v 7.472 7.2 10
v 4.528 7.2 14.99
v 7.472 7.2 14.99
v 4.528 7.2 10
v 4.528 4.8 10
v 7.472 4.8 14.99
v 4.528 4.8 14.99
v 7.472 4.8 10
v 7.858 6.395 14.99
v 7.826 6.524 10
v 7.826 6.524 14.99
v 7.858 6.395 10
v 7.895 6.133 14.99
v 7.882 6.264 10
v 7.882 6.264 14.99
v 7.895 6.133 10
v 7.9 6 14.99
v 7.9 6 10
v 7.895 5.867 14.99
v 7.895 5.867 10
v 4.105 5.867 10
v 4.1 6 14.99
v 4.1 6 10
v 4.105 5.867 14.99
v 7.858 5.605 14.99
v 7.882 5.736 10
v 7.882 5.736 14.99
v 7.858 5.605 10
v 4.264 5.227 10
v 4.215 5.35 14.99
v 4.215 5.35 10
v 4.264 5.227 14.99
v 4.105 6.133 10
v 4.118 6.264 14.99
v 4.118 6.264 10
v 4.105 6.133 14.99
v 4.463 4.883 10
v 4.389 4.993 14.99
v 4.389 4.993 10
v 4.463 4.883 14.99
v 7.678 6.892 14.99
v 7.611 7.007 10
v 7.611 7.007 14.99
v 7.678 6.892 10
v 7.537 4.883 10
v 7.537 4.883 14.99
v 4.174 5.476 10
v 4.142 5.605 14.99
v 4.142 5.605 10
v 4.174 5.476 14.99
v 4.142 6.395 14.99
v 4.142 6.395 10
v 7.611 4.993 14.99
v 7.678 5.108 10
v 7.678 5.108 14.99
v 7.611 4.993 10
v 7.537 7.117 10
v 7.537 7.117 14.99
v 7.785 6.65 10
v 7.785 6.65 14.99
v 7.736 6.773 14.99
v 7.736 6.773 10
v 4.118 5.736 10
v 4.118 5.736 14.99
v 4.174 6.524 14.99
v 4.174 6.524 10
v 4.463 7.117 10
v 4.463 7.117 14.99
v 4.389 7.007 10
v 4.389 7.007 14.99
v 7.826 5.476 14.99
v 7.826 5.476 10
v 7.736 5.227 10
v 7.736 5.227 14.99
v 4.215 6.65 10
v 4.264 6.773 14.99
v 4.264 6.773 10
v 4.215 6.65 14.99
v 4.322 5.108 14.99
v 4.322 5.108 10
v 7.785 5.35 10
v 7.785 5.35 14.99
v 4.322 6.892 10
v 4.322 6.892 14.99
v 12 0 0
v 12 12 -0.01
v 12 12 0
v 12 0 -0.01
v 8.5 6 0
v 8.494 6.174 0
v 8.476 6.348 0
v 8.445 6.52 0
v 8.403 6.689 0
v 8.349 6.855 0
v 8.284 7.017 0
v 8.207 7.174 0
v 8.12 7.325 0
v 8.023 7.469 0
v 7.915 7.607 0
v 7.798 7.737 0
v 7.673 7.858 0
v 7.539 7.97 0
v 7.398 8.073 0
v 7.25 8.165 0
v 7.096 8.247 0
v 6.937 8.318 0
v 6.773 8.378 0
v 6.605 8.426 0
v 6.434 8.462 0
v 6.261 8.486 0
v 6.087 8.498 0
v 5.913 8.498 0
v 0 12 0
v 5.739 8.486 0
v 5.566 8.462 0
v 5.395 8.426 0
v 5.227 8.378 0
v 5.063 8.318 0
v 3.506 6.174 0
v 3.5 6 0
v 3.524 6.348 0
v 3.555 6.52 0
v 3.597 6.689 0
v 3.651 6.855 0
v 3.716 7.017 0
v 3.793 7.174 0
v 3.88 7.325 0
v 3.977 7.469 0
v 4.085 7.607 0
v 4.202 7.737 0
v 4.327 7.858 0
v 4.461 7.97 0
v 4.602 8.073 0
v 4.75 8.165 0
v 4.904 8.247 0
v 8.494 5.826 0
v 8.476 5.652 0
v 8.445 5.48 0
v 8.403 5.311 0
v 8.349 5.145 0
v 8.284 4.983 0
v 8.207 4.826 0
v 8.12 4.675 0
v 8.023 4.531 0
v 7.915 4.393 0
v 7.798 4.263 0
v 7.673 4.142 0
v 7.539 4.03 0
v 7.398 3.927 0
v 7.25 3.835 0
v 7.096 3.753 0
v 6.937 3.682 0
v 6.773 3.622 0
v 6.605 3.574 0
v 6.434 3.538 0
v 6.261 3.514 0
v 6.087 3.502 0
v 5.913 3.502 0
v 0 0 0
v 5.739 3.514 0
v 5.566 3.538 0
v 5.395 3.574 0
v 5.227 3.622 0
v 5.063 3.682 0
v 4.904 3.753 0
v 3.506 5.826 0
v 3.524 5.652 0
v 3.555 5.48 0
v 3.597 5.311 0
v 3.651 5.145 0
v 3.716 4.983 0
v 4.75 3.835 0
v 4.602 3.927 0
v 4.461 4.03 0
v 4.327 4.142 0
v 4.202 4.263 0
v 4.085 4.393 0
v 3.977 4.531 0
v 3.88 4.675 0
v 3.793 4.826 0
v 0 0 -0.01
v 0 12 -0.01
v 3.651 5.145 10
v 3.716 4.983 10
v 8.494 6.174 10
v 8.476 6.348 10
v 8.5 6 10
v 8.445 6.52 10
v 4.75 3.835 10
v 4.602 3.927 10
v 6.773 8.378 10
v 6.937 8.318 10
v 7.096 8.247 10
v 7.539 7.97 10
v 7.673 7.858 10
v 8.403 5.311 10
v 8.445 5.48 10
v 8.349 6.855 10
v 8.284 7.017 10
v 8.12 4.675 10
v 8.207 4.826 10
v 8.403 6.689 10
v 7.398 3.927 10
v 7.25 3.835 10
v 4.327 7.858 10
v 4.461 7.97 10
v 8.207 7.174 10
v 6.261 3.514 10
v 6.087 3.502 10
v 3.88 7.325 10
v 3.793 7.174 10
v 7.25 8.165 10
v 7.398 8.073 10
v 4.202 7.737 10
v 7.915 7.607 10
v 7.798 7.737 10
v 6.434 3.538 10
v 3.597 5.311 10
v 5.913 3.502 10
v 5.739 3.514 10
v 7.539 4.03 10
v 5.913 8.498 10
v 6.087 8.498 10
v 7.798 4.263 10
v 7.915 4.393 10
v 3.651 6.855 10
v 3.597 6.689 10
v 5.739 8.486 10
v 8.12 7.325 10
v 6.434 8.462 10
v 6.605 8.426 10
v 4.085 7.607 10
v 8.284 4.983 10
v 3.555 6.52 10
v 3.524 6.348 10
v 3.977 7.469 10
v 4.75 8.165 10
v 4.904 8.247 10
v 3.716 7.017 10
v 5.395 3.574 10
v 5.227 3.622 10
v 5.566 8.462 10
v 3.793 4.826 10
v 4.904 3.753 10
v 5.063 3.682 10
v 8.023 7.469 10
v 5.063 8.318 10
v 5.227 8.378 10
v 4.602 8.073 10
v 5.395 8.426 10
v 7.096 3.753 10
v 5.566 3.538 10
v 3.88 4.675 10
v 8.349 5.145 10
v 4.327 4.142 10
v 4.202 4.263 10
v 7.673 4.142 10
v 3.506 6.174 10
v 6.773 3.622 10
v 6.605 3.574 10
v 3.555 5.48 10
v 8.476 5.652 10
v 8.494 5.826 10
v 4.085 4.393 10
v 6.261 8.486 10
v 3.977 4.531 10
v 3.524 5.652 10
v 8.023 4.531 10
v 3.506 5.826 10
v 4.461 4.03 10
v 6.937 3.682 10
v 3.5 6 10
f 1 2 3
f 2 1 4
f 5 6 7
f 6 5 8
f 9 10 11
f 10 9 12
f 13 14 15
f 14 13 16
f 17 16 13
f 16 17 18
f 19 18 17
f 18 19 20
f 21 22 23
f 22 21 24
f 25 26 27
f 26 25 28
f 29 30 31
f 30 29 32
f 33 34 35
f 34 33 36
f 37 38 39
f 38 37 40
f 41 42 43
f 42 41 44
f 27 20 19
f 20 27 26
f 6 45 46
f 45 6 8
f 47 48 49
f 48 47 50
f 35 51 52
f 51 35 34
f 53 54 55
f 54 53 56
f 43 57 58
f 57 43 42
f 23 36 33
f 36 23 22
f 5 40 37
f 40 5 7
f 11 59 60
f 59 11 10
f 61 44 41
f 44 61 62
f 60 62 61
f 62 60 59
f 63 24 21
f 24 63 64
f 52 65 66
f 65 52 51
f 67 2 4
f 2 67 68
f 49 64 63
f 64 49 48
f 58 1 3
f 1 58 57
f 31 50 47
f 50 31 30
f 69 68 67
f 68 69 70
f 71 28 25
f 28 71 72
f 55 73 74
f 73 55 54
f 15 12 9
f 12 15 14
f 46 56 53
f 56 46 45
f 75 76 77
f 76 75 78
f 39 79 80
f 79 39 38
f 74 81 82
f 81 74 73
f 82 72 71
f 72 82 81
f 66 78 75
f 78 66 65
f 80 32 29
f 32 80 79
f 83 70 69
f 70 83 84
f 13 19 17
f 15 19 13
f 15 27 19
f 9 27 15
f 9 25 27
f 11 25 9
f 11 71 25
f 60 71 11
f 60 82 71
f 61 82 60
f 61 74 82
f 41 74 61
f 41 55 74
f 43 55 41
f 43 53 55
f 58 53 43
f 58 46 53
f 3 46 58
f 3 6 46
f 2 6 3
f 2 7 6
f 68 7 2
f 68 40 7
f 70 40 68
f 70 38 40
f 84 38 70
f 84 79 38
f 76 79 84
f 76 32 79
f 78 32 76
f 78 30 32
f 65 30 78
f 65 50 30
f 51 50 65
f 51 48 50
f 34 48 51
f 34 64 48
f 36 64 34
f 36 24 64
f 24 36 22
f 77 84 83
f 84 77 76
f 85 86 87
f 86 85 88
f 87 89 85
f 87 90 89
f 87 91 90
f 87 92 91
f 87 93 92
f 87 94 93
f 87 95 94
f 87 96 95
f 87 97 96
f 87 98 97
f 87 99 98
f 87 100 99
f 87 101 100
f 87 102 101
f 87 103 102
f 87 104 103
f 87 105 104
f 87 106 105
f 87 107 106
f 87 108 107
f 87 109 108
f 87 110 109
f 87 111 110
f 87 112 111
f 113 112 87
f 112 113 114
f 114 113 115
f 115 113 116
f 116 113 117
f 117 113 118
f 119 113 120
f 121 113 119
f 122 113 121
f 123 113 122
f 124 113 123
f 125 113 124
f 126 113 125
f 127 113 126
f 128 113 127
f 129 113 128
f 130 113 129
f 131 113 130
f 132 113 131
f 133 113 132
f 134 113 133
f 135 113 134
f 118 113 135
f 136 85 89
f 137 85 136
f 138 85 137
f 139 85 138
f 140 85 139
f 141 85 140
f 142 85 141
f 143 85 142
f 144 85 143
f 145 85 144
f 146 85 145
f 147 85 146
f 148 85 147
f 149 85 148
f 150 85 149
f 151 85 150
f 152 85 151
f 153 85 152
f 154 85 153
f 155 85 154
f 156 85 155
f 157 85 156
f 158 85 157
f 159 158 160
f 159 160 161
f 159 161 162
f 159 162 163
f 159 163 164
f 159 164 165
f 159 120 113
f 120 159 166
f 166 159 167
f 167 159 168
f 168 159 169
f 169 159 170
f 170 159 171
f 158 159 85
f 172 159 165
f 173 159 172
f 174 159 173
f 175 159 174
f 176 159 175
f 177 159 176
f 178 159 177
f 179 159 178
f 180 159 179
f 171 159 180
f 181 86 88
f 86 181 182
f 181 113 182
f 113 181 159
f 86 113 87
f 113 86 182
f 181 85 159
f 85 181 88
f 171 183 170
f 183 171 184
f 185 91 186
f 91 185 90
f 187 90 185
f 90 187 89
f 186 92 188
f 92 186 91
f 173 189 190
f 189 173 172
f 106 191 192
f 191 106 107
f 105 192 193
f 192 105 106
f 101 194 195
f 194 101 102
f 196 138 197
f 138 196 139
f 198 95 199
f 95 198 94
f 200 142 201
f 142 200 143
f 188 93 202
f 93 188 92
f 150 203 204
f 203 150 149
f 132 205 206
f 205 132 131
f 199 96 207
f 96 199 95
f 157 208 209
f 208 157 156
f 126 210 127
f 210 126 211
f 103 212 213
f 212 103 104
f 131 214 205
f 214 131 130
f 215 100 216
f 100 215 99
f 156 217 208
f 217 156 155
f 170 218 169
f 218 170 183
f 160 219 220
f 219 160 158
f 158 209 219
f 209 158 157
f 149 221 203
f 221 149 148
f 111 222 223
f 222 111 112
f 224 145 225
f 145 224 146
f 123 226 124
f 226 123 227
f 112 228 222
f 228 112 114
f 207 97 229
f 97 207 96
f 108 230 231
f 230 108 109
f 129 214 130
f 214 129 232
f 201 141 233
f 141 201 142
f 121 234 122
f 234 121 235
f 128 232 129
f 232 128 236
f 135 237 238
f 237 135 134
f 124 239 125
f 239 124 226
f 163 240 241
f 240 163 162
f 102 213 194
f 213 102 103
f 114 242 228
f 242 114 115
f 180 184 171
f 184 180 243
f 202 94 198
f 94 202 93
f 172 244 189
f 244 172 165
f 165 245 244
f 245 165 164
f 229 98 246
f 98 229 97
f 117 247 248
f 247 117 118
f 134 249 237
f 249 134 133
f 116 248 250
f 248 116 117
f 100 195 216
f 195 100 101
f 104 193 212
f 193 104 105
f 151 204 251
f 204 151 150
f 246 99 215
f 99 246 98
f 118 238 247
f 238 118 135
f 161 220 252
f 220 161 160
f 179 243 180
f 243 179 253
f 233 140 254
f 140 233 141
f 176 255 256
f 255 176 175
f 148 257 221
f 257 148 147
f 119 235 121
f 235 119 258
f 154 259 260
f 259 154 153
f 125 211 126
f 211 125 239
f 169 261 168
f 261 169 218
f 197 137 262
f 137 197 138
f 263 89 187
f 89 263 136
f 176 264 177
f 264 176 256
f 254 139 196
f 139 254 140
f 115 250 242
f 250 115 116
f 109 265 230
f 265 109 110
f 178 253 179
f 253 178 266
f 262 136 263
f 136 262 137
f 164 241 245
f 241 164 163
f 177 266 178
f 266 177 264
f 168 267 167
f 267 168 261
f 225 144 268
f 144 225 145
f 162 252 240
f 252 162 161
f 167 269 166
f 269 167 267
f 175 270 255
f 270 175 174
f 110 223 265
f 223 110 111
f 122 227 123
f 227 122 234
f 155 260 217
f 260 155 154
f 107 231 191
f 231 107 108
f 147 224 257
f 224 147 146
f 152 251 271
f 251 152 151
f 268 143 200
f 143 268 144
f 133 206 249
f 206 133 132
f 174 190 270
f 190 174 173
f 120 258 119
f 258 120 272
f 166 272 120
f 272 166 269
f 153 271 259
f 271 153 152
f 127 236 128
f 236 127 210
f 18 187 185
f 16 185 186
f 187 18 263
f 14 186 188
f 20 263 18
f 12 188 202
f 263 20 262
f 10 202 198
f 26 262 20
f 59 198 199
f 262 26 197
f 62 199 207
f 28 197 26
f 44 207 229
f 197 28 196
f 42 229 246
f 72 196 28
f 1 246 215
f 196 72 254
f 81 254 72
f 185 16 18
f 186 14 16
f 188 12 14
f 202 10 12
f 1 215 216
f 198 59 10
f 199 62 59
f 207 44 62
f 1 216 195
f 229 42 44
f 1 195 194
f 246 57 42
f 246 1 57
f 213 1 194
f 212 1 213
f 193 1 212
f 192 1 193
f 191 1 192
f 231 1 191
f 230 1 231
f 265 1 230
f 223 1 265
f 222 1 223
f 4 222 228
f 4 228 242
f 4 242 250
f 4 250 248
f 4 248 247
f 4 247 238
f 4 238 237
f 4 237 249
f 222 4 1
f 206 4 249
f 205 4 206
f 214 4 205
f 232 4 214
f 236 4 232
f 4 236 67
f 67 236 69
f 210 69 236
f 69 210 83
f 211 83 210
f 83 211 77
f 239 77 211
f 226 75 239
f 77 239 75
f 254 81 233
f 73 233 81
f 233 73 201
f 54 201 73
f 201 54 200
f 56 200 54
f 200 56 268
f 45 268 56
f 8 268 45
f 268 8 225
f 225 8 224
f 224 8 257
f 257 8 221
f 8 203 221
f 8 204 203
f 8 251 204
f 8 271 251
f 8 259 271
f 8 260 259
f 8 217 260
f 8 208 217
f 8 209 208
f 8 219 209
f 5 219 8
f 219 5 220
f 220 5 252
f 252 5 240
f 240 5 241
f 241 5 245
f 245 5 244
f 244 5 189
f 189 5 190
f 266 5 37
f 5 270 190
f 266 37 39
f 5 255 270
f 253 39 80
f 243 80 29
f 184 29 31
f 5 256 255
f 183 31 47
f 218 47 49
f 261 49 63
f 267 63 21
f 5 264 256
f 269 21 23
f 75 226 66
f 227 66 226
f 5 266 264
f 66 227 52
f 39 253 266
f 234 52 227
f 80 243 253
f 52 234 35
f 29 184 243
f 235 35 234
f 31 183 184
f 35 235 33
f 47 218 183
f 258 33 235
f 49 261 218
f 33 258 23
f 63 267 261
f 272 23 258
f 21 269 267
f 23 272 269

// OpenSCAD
// file: ../Base/PlacementOptions.scad
// Fischertechnik Box Foundation
// Placement Options

// Alignment
NoAlign = 0;
AlignLeft = 1;
AlignBottom = 2;
AlignCenter = 3;
AlignRight = 4;
AlignTop = 5;

// Element rotation degree steps
rotations = [0, -90, -180, -270];

// Rotation
NoRotation = 0;
Rotate0 = 0;
Rotate90 = 1;
Rotate180 = 2;
Rotate270 = 3;

// Docking (seen from above)
NoDock = -1;
DockLeft = 0;
DockTop = 1;
DockRight = 2;
DockCorner = 2;
DockBottom = 3;

// Web corners
LowerLeft = 0;
UpperLeft = 1;
UpperRight = 2;
LowerRight = 3;

// Web position relative to corner
LeftOfCorner = 0;
RightOfCorner = 1;

// Rails direction
Horizontal = true;
Vertical = false;
// file: ../Base/Boxes.scad
// Fischertechnik Box Foundation
// Pre-designed Boxes

use <Constants.scad>

include <PlacementOptions.scad>

box190Width = 190;
box190Depth = 130;
box130Width = 130;
box130Depth = 95;

// Values are from an original ec3 box
topBottomDifference = 1.5;
outerHeight = 40;
baseThickness = 1.8;
innerHeight = outerHeight - baseThickness;
stackExcess = 5.7;
radius = 3.5;
wallThickness = 1.5;
tolerance = 0.2;

boxWallThickness = wallThickness;
boxBaseThickness = baseThickness;
boxWebWidth = 3.0;

// getBoxWallThickness()
// Gets the wall thickness of a Fischertechnik Box
function getBoxWallThickness() = boxWallThickness;

// getBoxUsageHeight(height = 38.2)
// Gets the usable height of a Fischertechnik box
// height = Outer height of the box from the bottom to the upper edge.
function getBoxUsageHeight(height = outerHeight) = height - baseThickness - stackExcess;

// getBoxInnerHeight()
// Gets the inner height of a Fischertechnik box, including the stack excess
function getBoxInnerHeight() = innerHeight;

// getBoxBaseThickness()
// Gets the thickness of the Fischertechnik box base.
function getBoxBaseThickness() = boxBaseThickness;

// getBoxWebWidth()
// Gets the width of a box web
function getBoxWebWidth() = boxWebWidth;

// getBox190Space()
// Gets the usable inner space of a Box 190 as an x/y-list
function getBox190Space() = [
    box190Width - 2*getBoxWallThickness() - topBottomDifference, 
    box190Depth - 2*getBoxWallThickness() - topBottomDifference ];

// RoundedCornerPlate(width, depth, height, radius)
// Creates a body plate with rounded corners for a box. Used
// also to create the complete box with the hull module.
// width = Width of the plate
// depth = depth of the plate 
// height = thickness of the plate
// radius = radius of the rounded corner
module RoundedCornerPlate(width, depth, height, radius) {
    translate([radius, radius])
    hull() {
        w = width-2*radius;
        d = depth-2*radius;
        cube([w, d, height]);
        cylinder(height, r=radius, $fn=getFragments());
        translate([w, 0])
            cylinder(height, r=radius, $fn=getFragments());
        translate([w, d])
            cylinder(height, r=radius, $fn=getFragments());
        translate([0, d])
            cylinder(height, r=radius, $fn=getFragments());
    }
}

// BoxBase(width, depth)
// Creates an empty stackable Fischertechnik compatible box
// width = Outer width of the box (190, 130, ...)
// depth = Outer depth of the box (130, 95, ...)

module BoxBase(width, depth, height=outerHeight) {    
    thinPlate = 0.01;

    innerHeight = height - baseThickness;    
    
    module Body(tolerance=tolerance) {
        hull() {
            // Bottom with tolerance to fit into the original boxes when stacked
            translate([-wallThickness+tolerance, -wallThickness+tolerance, -baseThickness])
                RoundedCornerPlate(width-topBottomDifference-2*tolerance, depth-topBottomDifference-2*tolerance, thinPlate, radius);
            
            // Top
            translate([-wallThickness-topBottomDifference/2, -wallThickness-topBottomDifference/2, innerHeight-thinPlate])
                RoundedCornerPlate(width, depth, thinPlate, radius);
         }
    }

    module Cutoff() {
        hull() {
            coWidth = width - 2*wallThickness;
            coDepth = depth - 2*wallThickness;
            
            // Bottom
            RoundedCornerPlate(coWidth-topBottomDifference, coDepth-topBottomDifference, thinPlate, radius);

            // Top
            translate([-topBottomDifference/2, -topBottomDifference/2, innerHeight+thinPlate]) 
                RoundedCornerPlate(coWidth, coDepth, thinPlate, radius);
        }
    }
    
    difference() {        
        Body();
        Cutoff();
        stackOffset = innerHeight - stackExcess;
        translate([0, 0, stackOffset + baseThickness])
            Body(tolerance=0);
    }
}

// Creates the Fischertechnik empty box 130x190 mm and places it at position 0,0
// 190x130 are the outer sizes, the inner space is slightly smaller. Use getBox190Space() to get the inner sizes.
// The box is positioned that the usable inner space is at the 0,0,0 position.

module Box190() {
    BoxBase(box190Width, box190Depth);
}

// Gets the usable inner space of a Box 130 as an x/y-list
function getBox130Space() = [
    box130Width - 2*getBoxWallThickness() - topBottomDifference, 
    box130Depth - 2*getBoxWallThickness() - topBottomDifference ];

// Creates the Fischertechnik empty box 95x130 mm and places it at position 0,0
// 190x130 are the outer sizes, the inner space is slightly smaller. Use getBox190Space() to get the inner sizes.
// The box is positioned that the usable inner space is at the 0,0,0 position.

module Box130() {
    BoxBase(box130Width, box130Depth);
}

// Creates a web at the specified box walls
// corner 0 = LowerLeft, 1 = UpperLeft, 2 = UpperRight, 3 = LowerRight
// side 0 = LeftOfCorner, 1 = RightOfCorner
// distance = Distance in mm from the corner
// boxSpace = inner width and depth of the box (default: Box 190)
// webWidth = length of the web (default is 3 mms)
// webThickness = thickness of the web (default is 1 mm)
// height = Height of the web (standard is getBoxUsageHeight())
// sink = How much of the web is sunk into the wall

module BoxWeb(
    corner, 
    side, 
    distance, 
    boxSpace=getBox190Space(), 
    webWidth=getBoxWebWidth(), 
    webThickness=1.0, 
    height=getBoxUsageHeight(),
    sink = getBoxWallThickness()/2) {
    width = (corner % 2 == 0) ? 
            (side == LeftOfCorner ? webWidth : webThickness) :
            (side == LeftOfCorner ? webThickness : webWidth);

    depth = (corner % 2 == 0) ? 
            (side == RightOfCorner ? webWidth : webThickness) :
            (side == RightOfCorner ? webThickness : webWidth);
    
    xDiff = corner == LowerLeft ? 
                (side == LeftOfCorner ? -sink : distance) :
            (corner == UpperLeft ?                
                (side == LeftOfCorner ? distance : -sink) :
            (corner == UpperRight ?
                (side == LeftOfCorner ? boxSpace.x-webWidth+sink : boxSpace.x-distance-webThickness) :
                (side == LeftOfCorner ? boxSpace.x-distance-webThickness: boxSpace.x-webWidth+sink)));

    yDiff = corner == LowerLeft ? 
                (side == RightOfCorner ? -sink : distance) :
            (corner == UpperLeft ?
                (side == RightOfCorner ? boxSpace.y-distance-webThickness : boxSpace.y-webWidth+sink) :
            (corner == UpperRight ?
                (side == RightOfCorner ? boxSpace.y-webWidth+sink : boxSpace.y-distance-webThickness) :
                (side == RightOfCorner ? distance : -sink)));
    
    translate([xDiff, yDiff, -getExcess()])
        cube([width, depth, height + 2*getExcess()]);
}
// file: ../Base/Rotation.scad
// Fischertechnik Box Foundation
// Geometry Helpers Rotation

include <PlacementOptions.scad>

// getRotatedSpace(space, rotation=NoRotation)
// Rotates the space dependent on the specified rotation

function getRotatedSpace(space, rotation=NoRotation) = [
    (rotation == Rotate90 || rotation == Rotate270) ? space.y : space.x,
    (rotation == Rotate90 || rotation == Rotate270) ? space.x : space.y
];

// Rotates the given space around the fixed left lower corner
// space = the space the children needs as width/depth list [width,depth]
// rotation = 0 Rotate0 degrees, 1 Rotate90 degrees, 2 Rotate180 degrees, 3 Rotate270 degrees (equivalent to -90)

module RotateFix(space, rotation=NoRotation) {
    dy = (rotation == Rotate0 || rotation == Rotate270) ? 0 :
        (rotation == Rotate90) ? space.x :
        space.y;
    dx = (rotation < Rotate180) ? 0 :
        (rotation == Rotate180) ? space.x :
        space.y;
    
    translate([dx, dy, 0])
        rotate([0, 0, rotations[rotation]])
            children();
}
// file: ../Base/Alignment.scad
// Fischertechnik Box Foundation
// Geometry Helpers Alignment

include <PlacementOptions.scad>

// getAlignedX(elementWidth, spaceWidth, align=AlignRight, offset=0)
// Gets the aligned X offset of an element with the given
// width in the given space.
// elementWidth = The width of the element to positon
// spaceWidth = The space where the element should be aligned
// align = 0 AlignLeft, 1 AlignCenter, 2 AlignRight
// offset = an optional offset from the aligned position. When
// aligned left or centered, then positive values are in X direction.
// When aligned right then positive values are in negative X direction.

function getAlignedX(elementWidth, spaceWidth, align=AlignRight, offset=0) =
    (align == AlignLeft) ?
        offset :
        ((align == AlignCenter) ?
        (spaceWidth - elementWidth)/2 + offset :
        spaceWidth - offset - elementWidth);

// getAlignedY(elementDepth, spaceDepth, align=AlignTop, offset=0)
// Gets the aligned Y offset of an element with the given
// depth in the given space.
// elementDepth = The depth of the element to positon
// spaceDepth = The space where the element should be aligned
// align = 0 AlignBottom, 1 AlignCenter, 2 AlignTop
// offset = an optional offset from the aligned position. When
// aligned bottom or centered, then positive values are in Y direction.
// When aligned top then positive values are in negative Y direction.

function getAlignedY(elementDepth, spaceDepth, align=AlignTop, offset=0) =
    (align == AlignBottom) ?
        offset :
        ((align == AlignCenter) ?
        (spaceDepth - elementDepth)/2 + offset :
        spaceDepth - offset - elementDepth);
// file: ../Base/Placement.scad
// Fischertechnik Box Foundation
// Geometry Helpers Placement

use <Constants.scad>
use <Alignment.scad>
use <Rotation.scad>
use <Boxes.scad>

include <PlacementOptions.scad>

// Place(x=0, y=0, elementSpace=[0,0], alignX=AlignLeft, alignY=AlignBottom, rotation=Rotate0, boxSpace=getBox190Space())
// Places the child at the specified position
// y = Y-Position. This is a relative position when an X aligment is specified.
// x = X-Position. This is a relative position when an Y aligment is specified.
// elementSpace = space of the element to be placed [x,y]
// alignX = -1=NoAlign, 0 AlignLeft, 1 AlignCenter, 3 AlignRight (elementSpace and boxSpace required!)
// alignY = -1=NoAlign, 2 AlignBottom, 1 AlignCenter, 4 AlignTop (elementSpace and boxSpace required!)
// rotation = 0 Rotate0 0 degrees, 1 Rotate90 90 degrees, 
// 2 Rotate180 180 degrees, 3 Rotate270 270 degrees (equivalent to -90)
// boxSpace = Inner space of the box where the placement occurs [x,y] - default is Box 190x130 inner space

module Place(x=0, y=0, elementSpace=[0,0], 
  alignX=AlignLeft, alignY=AlignBottom, 
  rotation=NoRotation, boxSpace=getBox190Space()) {

    module Position(x, y, space, rotation=Rotate0) {
        translate([x, y, 0])
            RotateFix(space, rotation)
                children();
    }

    space = getRotatedSpace(elementSpace, rotation);
    alignedX = getAlignedX(space.x, boxSpace.x, alignX, x);
    alignedY = getAlignedY(space.y, boxSpace.y, alignY, y);
    Position(alignedX, alignedY, elementSpace, rotation)
        children();
}

// Center(space=getBox130Space(), elementSpace=[0,0])
// space = Space where the children is centered. For cylinder use centered=true and no elementSpace.
// elementSpace = space of the element to be centered [x,y]

module Center(space=getBox190Space(), elementSpace=[0,0]) {
    Place(elementSpace=elementSpace, boxSpace=space, alignX=AlignCenter, alignY=AlignCenter)
        children();
}

// CenterHorizontal(width=0, y=0, offset=0, space=getBox130Space())
// width = Width of the element to be placed.
// y = Y position of the element
// offset = Offset from the center position (negative will be left of the center)
// space = Space where the element is placed

module CenterHorizontal(width=0, y=0, offset=0, space=getBox190Space()) {
    Place(x=offset, y=y, elementSpace=[width, 0], boxSpace=space, alignX=AlignCenter)
        children(0);
}

// CenterVertical(depth=0, x=0, offset=0, space=getBox130Space())
// depth = Depth of the element to be placed.
// x = X position of the element
// offset = Offset from the center position (negative will be down of the center)
// space = Space where the element is placed

module CenterVertical(depth=0, x=0, offset=0, space=getBox190Space()) {
    Place(x=x, y=offset, elementSpace=[0, depth], boxSpace=space, alignY=AlignCenter)
        children(0);
}

// getIsVertical(align)
// True if the specified alignment needs a vertical orientation for a divider (AlignRight, AlignLeft)

function getIsVertical(align) = (align == AlignRight || align == AlignLeft);

// getIsHorizontal(align)
// True if the specified alignment needs a horizontal orientation for a divider (AlignTop, AlignBottom)

function getIsHorizontal(align) = (align == AlignTop || align == AlignBottom);
// file: ../Base/Constants.scad
// Fischertechnik Box Foundation
// Constants

// Constant values necessary for multiple elements

// Base constants
dividerThickness = 1.2;
excess = 0.01;
fragments = 90;
tolerance = 0.8;

// Gets the thickness of a divider 
function getDividerThickness() = dividerThickness;

// Gets the excess that is used to merge walls into each other
function getExcess() = excess;

// Gets amount of fragments of a cylinder
function getFragments() = fragments;

// Gets the inner tolerance of a frame to each side
function getTolerance() = tolerance;


// Fischertechnik specific constants
axisDiameter = 4;
axisBottomDiameter = axisDiameter + 1;
axisTolerance = 0.2;
axisLockingLength = 8;

// Gets axis diameter of Fischertechnik axis
function getAxisDiameter() = axisDiameter;

// Gets axis diameter tolerance (subtracted for element axis)
function getAxisTolerance() = axisTolerance;

// Gets the axis diameter for standing axis
function getStandAxisDiameter() = getAxisDiameter() - getAxisTolerance();

// Gets axis bottom diameter for thicker part at the bottom
function getAxisBottomDiameter() = axisBottomDiameter;

// Gets the lengthh of the locking part of a locking axis
function getAxisLockingLength() = axisLockingLength;

// Studs

studHeight = 2.5;
studTolerance = 0.2;

// gets the height of a connecting stud
function getStudHeight() = studHeight;

// gets the connecting stud height tolerance
function getStudTolerance() = studTolerance;

// Dockable Frame with Edge

standardEdgeDistance = 2.5;
standardWebDistance = 11.5;
standardCornerLength = 15;

// gets the standard distance to the wall of the box for dockable frames with webs
function getStandardEdgeDistance() = standardEdgeDistance;

// gets the standard distance of each web to the corner of the dockable frame
function getStandardWebDistance() = standardWebDistance;

// gets the standard length of the corner walls of a dockable frame
function getStandardCornerLength() = standardCornerLength;

// Tubes

tubeWallFactor = 0.8;

// gets the wall thickness of a tube.
function getTubeWallThickness() = tubeWallFactor * getDividerThickness();

// Small Parts and Divider Frame

smallPartsFrameHeight = 20;

// gets the frame height for docked small parts boxes.
function getSmallPartsFrameHeight() = smallPartsFrameHeight;

// Hubs

hubRingDiameter = 19.5;
hubRingLevelDiameter = 21;

// gets the diameter of a tube matching the inner ring of a wheel
function getHubRingDiameter() = hubRingDiameter;

// gets the diameter of a hub tube with a thicker diameter
function getHubRingLevelDiameter() = hubRingLevelDiameter;

// Struts

strutAddLength = 9.0;
strutDepth = 8.0;

// gets the full length of a strut
function getFullStrutLength(length) = length + strutAddLength;

// gets the radius of the end of a strut
function getStrutEndRadius() = strutAddLength / 2;

// gets the the depth of a strut
function getStrutDepth() = strutDepth;
// main file
// Fischertechnik Box Library
// Axis for Locking Pulley 12
// 136775

use <../Base/Constants.scad>
use <../Base/Placement.scad>
use <../ModelBase/Simple.scad>

/* [Hidden] */
width = 12;
depth = 12;

// getAxisLockingPulley12Space()
// Gets the space the locking pulley needs

function getAxisLockingPulley12Space() = [width, depth];

// AxisLockingPulley12()
// Standing locking axis for locking pulley.

module AxisLockingPulley12() {
    space = [width, depth];
    height = 10;
    Space(space);
    translate([width/2, depth/2])
    cylinder(d=getAxisBottomDiameter(), h=height, $fn=getFragments());
    translate([0, 0, height-getExcess()])
        Center(space)
            LockingAxis(5);
}

// Tests
color("lightgray")
AxisLockingPulley12();
